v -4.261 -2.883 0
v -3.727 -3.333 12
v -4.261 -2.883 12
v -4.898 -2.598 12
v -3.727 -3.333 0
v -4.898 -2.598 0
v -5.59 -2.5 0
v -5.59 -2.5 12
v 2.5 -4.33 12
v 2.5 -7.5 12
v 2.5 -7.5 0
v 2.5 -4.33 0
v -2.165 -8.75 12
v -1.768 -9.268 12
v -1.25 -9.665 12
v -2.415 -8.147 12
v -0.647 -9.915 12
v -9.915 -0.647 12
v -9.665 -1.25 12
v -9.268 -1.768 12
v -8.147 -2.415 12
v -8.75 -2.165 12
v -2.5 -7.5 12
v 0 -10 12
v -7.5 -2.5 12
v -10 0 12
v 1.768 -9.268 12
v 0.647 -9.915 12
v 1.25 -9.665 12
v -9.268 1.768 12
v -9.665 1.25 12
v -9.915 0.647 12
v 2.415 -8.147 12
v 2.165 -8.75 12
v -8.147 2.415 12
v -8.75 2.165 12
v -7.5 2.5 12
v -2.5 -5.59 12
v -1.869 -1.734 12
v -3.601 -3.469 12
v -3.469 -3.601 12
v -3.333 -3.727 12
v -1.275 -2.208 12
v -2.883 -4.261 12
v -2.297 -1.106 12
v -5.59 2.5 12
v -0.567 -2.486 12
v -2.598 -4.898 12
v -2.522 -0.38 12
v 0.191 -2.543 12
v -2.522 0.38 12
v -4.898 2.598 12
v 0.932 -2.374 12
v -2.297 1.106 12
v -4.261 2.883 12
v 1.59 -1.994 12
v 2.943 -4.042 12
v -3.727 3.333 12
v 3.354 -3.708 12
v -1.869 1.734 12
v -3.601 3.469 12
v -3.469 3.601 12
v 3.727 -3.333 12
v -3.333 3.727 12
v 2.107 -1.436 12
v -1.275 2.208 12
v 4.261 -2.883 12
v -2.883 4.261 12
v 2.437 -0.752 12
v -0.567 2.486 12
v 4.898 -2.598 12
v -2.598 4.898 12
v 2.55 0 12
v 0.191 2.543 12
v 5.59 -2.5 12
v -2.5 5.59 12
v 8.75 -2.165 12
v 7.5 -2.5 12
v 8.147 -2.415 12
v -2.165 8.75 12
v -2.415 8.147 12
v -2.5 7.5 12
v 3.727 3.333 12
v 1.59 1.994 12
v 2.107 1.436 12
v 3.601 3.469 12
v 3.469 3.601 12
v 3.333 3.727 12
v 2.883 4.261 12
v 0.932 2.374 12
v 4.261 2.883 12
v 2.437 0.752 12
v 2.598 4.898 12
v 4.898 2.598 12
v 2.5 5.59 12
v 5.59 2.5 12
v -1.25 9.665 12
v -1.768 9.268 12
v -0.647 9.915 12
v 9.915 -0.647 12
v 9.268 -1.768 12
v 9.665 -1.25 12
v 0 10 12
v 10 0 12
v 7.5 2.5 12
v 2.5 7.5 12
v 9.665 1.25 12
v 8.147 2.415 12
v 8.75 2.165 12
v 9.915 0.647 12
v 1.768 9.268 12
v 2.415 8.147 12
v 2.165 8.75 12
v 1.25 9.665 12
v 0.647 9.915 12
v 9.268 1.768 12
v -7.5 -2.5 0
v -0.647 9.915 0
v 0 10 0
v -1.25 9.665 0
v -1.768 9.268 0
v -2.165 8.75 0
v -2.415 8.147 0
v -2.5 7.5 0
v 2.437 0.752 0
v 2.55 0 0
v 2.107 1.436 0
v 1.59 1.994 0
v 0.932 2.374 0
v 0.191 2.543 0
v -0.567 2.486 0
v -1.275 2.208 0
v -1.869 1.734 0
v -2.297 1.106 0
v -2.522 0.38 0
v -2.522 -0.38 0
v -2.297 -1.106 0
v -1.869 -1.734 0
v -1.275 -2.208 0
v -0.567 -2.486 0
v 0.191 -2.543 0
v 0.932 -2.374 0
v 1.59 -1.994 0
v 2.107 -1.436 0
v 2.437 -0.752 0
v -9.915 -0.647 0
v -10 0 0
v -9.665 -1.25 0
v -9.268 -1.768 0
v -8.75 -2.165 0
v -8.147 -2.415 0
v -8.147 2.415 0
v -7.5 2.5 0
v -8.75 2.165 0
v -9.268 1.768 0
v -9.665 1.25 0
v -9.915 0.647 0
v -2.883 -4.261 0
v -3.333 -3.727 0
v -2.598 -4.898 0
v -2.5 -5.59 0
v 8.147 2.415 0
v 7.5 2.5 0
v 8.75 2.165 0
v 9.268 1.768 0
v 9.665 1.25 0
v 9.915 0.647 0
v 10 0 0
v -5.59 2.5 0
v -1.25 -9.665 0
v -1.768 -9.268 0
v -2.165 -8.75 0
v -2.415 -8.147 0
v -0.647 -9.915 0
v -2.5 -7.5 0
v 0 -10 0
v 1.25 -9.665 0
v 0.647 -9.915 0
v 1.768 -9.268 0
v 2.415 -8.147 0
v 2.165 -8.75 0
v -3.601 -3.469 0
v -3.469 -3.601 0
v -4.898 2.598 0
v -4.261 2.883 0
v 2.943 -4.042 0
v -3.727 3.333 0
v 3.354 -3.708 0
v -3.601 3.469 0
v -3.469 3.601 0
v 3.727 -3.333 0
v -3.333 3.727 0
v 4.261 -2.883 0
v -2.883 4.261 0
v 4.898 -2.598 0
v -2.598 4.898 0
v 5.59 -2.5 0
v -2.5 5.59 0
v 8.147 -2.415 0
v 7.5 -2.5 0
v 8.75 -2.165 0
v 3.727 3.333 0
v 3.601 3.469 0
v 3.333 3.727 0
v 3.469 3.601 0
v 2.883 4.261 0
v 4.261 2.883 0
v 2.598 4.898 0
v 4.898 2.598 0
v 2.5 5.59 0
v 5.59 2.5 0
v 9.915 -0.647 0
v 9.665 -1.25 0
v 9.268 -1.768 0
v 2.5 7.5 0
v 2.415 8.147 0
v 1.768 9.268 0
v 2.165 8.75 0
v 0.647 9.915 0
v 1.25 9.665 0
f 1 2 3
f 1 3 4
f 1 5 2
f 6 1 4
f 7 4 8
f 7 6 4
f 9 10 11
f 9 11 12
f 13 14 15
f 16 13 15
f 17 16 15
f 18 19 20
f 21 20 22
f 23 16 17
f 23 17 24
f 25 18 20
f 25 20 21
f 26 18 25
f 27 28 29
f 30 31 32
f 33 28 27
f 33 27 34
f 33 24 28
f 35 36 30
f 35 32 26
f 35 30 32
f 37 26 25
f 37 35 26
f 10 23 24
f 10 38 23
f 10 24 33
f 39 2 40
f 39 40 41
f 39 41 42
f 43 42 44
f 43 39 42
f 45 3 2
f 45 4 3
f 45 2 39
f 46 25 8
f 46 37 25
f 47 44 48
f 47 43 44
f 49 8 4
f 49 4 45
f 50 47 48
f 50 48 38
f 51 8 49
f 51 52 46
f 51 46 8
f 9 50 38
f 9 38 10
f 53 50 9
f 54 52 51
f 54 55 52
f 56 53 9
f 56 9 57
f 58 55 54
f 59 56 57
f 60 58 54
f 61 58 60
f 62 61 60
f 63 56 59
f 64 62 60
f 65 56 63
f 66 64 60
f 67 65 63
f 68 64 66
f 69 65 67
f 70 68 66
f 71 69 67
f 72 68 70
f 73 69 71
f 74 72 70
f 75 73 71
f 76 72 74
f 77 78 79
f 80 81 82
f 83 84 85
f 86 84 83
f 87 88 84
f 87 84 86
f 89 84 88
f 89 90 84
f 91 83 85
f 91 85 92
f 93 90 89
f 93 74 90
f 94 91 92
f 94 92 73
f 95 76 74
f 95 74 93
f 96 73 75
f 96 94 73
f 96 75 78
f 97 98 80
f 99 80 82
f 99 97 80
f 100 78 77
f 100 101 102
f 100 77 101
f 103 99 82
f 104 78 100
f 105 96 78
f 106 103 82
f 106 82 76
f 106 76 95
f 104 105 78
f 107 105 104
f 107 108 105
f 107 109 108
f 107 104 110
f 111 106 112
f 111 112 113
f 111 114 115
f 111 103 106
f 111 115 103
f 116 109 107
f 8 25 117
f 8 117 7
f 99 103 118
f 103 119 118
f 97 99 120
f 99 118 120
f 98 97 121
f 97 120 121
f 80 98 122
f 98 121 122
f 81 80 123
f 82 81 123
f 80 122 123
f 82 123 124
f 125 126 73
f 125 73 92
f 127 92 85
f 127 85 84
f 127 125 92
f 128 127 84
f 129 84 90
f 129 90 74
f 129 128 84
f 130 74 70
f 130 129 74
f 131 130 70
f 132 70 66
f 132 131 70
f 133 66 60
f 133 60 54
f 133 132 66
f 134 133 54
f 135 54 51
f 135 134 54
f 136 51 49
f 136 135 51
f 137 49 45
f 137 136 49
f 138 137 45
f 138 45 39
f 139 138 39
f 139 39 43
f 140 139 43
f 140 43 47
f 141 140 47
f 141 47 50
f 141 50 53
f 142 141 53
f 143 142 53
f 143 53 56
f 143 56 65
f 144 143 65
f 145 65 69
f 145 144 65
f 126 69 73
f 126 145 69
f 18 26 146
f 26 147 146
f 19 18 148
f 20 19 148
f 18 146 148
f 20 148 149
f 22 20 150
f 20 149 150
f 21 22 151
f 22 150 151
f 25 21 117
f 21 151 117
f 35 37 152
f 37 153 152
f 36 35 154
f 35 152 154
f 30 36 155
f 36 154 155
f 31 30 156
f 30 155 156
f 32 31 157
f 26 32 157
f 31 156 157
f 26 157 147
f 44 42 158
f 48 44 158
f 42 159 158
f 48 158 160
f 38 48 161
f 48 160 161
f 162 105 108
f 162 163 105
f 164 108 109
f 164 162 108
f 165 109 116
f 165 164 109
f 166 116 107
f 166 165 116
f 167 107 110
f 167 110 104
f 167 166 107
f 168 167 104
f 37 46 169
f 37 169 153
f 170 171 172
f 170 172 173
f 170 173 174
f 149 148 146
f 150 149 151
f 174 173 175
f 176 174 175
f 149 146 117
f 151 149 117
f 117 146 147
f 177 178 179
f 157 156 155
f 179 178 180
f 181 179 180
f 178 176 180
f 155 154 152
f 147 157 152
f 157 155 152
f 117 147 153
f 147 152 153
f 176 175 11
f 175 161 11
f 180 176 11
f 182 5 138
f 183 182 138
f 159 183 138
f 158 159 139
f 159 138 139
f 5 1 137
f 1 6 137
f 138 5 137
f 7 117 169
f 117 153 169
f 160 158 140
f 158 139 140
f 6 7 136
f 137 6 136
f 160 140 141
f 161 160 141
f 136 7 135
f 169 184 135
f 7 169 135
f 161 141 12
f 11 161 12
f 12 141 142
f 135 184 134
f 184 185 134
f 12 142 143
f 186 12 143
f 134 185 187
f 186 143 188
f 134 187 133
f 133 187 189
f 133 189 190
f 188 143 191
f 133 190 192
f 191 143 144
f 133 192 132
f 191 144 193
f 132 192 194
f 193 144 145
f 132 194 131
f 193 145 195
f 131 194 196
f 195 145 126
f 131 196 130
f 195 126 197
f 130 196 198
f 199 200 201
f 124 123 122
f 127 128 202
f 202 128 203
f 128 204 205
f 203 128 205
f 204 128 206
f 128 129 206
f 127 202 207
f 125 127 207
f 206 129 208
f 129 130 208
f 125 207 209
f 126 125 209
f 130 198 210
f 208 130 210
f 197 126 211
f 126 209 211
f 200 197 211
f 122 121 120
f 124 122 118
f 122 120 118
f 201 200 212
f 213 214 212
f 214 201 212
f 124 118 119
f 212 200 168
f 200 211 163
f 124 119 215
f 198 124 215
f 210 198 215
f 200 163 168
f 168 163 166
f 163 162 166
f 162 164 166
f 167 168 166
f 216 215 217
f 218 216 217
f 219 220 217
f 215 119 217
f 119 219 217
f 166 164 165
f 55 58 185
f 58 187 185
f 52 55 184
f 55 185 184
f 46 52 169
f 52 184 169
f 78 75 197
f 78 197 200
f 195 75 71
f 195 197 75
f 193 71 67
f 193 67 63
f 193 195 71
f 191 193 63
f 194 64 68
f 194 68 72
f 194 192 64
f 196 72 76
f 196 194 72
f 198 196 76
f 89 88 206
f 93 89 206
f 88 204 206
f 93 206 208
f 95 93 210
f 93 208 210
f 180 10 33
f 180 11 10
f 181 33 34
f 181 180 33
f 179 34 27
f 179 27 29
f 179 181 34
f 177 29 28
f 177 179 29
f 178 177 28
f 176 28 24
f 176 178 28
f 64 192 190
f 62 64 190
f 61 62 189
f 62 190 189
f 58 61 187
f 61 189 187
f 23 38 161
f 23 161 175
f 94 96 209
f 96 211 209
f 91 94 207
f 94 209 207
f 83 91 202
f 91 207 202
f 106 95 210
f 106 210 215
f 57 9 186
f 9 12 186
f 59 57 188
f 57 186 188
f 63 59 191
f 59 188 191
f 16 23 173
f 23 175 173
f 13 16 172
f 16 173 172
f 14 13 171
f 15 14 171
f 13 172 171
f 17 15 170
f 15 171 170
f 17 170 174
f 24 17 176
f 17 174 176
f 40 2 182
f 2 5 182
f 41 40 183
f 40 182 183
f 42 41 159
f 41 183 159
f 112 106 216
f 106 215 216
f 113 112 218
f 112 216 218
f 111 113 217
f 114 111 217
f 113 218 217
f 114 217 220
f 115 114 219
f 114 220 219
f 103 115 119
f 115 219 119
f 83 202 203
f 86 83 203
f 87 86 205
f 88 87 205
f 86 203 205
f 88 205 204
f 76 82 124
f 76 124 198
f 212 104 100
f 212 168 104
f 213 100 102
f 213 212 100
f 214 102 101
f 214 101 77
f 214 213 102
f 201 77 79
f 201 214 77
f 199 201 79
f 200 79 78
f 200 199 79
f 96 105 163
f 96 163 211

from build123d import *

# Parameters (mm, degrees)
F0_R     = 5
F0_R_2   = 2.55
F1_DEPTH = 12
F3_DEPTH = 12
F4_R     = 2.49999


# Not quite as in the source:
# - a fillet or chamfer is up to 0.001 mm smaller than in the source, because OpenCascade refuses the exact size


with BuildPart() as f1:
    # F0 (on Top) → F1 (new body)
    with BuildSketch(Plane.XY):
        Circle(F0_R)
        Circle(F0_R_2, mode=Mode.SUBTRACT)
    extrude(amount=F1_DEPTH)

    # F2 (on face) → F3 (join)
    with BuildSketch(Plane.XY.offset(12)):
        with BuildLine():
            Line((-2.5, 10), (-2.5, 4.3301270189))
            ThreePointArc((-2.5, 4.3301270189), (0, 5), (2.5, 4.3301270189))
            Line((2.5, 4.3301270189), (2.5, 10))
            Line((2.5, 10), (-2.5, 10))
        make_face()
        with BuildLine():
            Line((10, 2.5), (4.3301270189, 2.5))
            ThreePointArc((4.3301270189, 2.5), (4.8296291314, 1.2940952255), (5, 0))
            ThreePointArc((5, 0), (4.8296291314, -1.2940952255), (4.3301270189, -2.5))
            Line((4.3301270189, -2.5), (10, -2.5))
            Line((10, -2.5), (10, 2.5))
        make_face()
        with BuildLine():
            ThreePointArc((2.5, -4.3301270189), (0, -5), (-2.5, -4.3301270189))
            Line((-2.5, -4.3301270189), (-2.5, -10))
            Line((-2.5, -10), (2.5, -10))
            Line((2.5, -10), (2.5, -4.3301270189))
        make_face()
        with BuildLine():
            ThreePointArc((-4.3301270189, -2.5), (-5, 0), (-4.3301270189, 2.5))
            Line((-4.3301270189, 2.5), (-10, 2.5))
            Line((-10, 2.5), (-10, -2.5))
            Line((-10, -2.5), (-4.3301270189, -2.5))
        make_face()
    extrude(amount=-F3_DEPTH)

    # F4 (radius 2.5 in the source; OpenCascade refuses exactly that, so slightly less here)
    f4_edges = [f1.edges().sort_by_distance(p)[0] for p in [
        (2.5, -10, 6),
        (10, -2.5, 6),
        (-10, -2.5, 6),
        (-2.5, -10, 6),
        (-10, 2.5, 6),
        (-2.5, 10, 6),
        (10, 2.5, 6),
        (2.5, 10, 6),
        (2.5, 4.330127, 6),
        (4.330127, 2.5, 6),
        (4.330127, -2.5, 6),
        (-2.5, 4.330127, 6),
        (-4.330127, 2.5, 6),
        (-2.5, -4.330127, 6),
        (-4.330127, -2.5, 6),
    ]]
    fillet(f4_edges, radius=F4_R)


solid = f1.part
